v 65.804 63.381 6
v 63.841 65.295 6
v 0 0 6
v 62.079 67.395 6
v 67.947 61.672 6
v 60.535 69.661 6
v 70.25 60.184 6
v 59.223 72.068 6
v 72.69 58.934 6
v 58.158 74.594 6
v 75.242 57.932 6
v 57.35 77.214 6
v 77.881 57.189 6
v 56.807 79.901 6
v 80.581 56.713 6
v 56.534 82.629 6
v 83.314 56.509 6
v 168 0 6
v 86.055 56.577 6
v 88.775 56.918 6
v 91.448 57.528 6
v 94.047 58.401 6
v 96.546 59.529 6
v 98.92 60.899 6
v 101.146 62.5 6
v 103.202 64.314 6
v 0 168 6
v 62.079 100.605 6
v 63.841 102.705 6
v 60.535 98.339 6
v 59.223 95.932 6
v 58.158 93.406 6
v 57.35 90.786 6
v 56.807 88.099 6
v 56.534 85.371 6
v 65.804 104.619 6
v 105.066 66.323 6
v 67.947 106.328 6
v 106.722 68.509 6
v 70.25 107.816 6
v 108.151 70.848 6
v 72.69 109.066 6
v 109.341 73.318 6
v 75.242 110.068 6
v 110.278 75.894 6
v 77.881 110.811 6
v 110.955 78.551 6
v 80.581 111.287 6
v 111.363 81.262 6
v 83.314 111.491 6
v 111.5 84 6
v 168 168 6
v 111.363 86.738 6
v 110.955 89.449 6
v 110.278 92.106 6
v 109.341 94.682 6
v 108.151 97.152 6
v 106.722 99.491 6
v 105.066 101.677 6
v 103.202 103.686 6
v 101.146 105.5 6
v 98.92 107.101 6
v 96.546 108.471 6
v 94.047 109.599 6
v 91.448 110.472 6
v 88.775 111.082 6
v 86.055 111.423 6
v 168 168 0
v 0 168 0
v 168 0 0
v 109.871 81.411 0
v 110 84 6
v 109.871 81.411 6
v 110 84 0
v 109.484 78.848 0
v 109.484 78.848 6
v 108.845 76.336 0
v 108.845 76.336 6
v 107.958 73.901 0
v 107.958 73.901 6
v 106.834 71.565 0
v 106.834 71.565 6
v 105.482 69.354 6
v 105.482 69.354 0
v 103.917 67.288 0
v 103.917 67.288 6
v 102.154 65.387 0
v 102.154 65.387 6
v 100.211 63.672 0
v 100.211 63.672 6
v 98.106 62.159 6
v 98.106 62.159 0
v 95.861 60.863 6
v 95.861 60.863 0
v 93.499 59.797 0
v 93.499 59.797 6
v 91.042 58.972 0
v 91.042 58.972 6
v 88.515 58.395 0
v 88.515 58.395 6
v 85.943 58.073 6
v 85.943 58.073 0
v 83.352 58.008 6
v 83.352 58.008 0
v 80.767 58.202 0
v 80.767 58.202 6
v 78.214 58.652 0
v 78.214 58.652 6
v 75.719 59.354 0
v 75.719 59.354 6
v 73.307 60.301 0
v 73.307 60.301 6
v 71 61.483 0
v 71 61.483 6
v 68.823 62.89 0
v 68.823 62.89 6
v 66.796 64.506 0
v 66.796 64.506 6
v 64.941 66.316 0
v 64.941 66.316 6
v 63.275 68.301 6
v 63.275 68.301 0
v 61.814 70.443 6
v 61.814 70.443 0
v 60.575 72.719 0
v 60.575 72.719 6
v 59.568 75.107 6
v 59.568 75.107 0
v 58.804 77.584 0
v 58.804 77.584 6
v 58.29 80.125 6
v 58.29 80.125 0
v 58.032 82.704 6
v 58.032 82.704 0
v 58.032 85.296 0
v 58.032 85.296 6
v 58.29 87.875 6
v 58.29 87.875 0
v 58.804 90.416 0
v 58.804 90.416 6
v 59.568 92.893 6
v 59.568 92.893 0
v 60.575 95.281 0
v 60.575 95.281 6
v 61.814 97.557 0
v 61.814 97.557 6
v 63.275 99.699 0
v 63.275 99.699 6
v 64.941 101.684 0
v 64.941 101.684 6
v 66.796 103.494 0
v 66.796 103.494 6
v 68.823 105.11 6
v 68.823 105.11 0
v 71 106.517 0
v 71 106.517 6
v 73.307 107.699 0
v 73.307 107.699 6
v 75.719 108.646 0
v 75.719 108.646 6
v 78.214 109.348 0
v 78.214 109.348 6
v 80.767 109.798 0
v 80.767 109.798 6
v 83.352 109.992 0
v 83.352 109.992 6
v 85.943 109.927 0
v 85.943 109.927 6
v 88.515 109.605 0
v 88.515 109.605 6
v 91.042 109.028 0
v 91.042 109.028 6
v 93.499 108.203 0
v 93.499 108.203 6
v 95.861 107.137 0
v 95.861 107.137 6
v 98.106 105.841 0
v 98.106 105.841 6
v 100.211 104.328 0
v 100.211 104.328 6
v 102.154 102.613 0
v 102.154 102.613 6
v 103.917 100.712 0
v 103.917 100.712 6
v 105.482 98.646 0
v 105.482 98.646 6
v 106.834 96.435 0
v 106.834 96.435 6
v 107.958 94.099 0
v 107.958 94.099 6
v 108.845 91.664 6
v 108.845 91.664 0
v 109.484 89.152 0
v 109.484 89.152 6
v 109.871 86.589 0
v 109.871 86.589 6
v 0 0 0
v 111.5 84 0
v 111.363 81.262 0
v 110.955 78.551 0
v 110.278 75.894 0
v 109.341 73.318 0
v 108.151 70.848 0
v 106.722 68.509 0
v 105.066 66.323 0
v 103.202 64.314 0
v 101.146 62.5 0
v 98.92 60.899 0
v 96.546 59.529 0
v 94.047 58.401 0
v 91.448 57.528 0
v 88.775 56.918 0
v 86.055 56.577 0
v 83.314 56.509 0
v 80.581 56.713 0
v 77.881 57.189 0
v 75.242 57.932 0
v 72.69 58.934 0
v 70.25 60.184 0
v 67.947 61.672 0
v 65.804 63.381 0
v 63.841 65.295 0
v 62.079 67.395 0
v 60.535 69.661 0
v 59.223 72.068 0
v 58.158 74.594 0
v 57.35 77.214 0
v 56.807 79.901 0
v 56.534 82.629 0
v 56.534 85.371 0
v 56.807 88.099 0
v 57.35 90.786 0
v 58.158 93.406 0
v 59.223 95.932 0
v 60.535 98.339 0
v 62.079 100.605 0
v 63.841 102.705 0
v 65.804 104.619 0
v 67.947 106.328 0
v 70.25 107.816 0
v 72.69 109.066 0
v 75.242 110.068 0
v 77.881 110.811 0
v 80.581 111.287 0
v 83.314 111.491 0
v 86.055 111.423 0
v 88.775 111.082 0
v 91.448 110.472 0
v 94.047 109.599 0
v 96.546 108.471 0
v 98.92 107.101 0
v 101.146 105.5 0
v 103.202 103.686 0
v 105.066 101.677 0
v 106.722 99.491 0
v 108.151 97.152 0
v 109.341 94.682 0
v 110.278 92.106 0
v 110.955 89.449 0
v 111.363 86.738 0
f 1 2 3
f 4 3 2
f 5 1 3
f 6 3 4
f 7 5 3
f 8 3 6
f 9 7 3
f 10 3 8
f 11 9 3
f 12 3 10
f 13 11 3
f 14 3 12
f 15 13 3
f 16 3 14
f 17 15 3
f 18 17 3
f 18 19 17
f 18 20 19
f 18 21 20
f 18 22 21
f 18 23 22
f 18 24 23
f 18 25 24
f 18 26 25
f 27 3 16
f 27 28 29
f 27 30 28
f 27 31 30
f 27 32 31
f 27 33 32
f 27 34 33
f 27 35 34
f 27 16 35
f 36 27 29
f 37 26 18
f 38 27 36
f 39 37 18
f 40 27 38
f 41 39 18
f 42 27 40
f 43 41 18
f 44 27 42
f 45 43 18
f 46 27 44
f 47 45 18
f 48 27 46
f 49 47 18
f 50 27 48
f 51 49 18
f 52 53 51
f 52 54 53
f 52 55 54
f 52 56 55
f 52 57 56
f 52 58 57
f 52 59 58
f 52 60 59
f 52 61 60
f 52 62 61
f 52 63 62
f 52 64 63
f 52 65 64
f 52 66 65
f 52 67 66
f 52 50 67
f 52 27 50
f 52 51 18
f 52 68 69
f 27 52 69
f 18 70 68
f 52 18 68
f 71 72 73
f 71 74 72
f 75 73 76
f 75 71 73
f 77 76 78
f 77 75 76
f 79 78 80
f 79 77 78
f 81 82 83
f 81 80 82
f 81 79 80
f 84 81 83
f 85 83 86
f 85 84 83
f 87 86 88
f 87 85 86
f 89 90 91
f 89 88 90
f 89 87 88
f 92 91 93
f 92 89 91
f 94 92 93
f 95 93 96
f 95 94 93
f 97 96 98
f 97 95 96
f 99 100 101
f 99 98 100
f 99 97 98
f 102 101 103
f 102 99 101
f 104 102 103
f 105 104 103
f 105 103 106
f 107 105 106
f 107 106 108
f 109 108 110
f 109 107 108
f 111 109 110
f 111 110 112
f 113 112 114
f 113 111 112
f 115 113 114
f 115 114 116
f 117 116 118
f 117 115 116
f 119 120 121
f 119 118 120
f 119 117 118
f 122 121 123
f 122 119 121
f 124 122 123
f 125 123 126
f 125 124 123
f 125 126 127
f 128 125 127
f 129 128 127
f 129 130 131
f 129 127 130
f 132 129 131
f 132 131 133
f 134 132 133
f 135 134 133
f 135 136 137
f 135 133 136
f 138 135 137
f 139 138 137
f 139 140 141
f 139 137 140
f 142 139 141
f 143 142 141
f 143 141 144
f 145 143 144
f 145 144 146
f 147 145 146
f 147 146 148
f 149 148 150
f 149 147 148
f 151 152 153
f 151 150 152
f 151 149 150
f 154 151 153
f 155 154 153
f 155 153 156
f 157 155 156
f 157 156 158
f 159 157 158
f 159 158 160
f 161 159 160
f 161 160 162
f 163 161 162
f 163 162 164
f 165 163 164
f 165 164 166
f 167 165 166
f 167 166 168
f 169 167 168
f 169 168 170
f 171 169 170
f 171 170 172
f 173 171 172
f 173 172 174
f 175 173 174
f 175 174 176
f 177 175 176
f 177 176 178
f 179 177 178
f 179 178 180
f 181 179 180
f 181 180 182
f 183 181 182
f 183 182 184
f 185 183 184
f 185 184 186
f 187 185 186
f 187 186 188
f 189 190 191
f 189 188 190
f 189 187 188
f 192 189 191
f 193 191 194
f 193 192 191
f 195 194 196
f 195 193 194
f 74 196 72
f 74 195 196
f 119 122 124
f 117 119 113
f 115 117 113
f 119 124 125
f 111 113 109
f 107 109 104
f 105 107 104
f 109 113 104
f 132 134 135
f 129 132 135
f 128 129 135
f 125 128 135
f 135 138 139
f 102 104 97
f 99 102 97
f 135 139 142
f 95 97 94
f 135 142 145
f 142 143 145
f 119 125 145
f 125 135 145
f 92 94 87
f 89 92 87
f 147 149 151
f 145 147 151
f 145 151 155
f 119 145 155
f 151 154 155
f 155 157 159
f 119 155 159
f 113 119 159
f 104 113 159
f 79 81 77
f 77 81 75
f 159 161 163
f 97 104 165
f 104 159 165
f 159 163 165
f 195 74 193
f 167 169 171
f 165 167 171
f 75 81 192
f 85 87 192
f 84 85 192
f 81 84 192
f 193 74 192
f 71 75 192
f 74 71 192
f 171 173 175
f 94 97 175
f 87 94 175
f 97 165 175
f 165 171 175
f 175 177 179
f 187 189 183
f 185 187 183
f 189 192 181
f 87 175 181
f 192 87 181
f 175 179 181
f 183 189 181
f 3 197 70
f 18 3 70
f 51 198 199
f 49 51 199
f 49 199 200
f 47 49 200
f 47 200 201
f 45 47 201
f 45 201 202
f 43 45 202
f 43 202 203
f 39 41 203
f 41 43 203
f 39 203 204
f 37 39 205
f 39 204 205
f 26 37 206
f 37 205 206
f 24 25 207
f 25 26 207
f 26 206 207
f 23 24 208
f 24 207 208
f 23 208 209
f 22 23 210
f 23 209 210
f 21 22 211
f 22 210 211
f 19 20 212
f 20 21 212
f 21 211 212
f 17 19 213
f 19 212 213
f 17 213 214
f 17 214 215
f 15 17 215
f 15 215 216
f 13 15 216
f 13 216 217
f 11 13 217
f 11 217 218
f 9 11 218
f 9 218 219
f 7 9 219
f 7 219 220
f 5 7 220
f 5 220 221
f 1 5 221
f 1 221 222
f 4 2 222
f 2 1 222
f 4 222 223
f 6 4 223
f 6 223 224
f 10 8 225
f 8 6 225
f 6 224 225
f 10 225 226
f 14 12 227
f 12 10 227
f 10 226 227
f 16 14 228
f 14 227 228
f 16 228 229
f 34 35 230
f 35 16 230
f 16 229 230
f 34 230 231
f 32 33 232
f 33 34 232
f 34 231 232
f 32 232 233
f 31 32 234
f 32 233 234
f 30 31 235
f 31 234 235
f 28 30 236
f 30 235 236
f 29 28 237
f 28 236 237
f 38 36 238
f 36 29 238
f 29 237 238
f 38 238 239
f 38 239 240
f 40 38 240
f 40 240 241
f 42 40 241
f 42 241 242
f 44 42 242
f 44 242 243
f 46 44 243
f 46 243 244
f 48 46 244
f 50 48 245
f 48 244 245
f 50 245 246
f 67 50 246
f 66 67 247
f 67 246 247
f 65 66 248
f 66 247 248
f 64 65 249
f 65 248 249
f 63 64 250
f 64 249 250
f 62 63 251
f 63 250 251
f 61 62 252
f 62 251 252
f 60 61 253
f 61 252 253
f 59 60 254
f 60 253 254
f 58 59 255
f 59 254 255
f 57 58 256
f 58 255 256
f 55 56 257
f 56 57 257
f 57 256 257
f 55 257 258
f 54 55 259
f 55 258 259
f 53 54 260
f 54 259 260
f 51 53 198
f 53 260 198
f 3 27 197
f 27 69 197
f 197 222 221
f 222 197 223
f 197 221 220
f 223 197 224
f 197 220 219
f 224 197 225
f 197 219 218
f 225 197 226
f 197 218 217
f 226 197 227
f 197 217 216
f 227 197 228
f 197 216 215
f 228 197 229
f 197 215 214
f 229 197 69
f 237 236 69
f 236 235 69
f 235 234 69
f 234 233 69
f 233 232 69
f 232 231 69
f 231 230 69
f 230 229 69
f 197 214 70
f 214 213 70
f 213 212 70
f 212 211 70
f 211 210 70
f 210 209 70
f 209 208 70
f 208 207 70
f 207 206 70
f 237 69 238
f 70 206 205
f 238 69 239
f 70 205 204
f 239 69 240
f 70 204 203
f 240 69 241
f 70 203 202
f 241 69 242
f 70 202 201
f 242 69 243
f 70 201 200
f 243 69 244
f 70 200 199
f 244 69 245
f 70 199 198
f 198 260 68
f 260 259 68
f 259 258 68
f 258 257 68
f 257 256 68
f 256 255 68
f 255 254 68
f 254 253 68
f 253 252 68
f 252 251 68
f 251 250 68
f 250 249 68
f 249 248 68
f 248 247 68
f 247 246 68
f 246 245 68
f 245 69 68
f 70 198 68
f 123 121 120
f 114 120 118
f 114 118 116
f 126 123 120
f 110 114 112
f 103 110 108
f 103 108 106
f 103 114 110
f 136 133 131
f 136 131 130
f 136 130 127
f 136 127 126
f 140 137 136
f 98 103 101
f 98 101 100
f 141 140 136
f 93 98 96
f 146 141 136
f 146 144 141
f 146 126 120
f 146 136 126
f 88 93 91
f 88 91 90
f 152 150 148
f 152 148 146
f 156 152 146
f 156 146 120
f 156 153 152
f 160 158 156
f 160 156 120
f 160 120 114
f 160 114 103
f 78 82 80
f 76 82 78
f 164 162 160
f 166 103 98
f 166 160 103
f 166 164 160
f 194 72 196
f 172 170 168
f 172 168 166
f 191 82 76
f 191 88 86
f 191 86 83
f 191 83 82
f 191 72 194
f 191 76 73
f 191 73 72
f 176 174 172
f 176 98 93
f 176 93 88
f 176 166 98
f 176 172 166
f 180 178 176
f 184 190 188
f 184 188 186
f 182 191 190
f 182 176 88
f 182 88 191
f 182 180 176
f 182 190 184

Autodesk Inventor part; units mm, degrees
ref_plane "YZ Plane" through (0, 0, 0) normal (1, 0, 0) x (0, 1, 0)
ref_plane "XZ Plane" through (0, 0, 0) normal (0, 1, 0) x (-1, 0, 0)
ref_plane "XY Plane" through (0, 0, 0) normal (0, 0, 1) x (1, 0, 0)
sketch "Szkic1" plane through (0, 0, 0) normal (0, 0, 1) x (1, 0, 0)
  line L0 (0, 0) -> (168, 0)
  line L1 (168, 0) -> (168, 168)
  line L2 (168, 168) -> (0, 168)
  line L3 (0, 168) -> (0, 0)
  circle A0 centre (84, 84) radius 27.5
  circle A1 centre (84, 84) radius 26
  dimension "d0" = 168
  dimension "d1" = 168
  dimension "d2" = 55
  dimension "d3" = 84
  dimension "d4" = 52
extrude "Wyciągnięcie proste1" add sketch "Szkic1" along normal blind 6
properties part number "Sciana_pokrywka_168x168"
